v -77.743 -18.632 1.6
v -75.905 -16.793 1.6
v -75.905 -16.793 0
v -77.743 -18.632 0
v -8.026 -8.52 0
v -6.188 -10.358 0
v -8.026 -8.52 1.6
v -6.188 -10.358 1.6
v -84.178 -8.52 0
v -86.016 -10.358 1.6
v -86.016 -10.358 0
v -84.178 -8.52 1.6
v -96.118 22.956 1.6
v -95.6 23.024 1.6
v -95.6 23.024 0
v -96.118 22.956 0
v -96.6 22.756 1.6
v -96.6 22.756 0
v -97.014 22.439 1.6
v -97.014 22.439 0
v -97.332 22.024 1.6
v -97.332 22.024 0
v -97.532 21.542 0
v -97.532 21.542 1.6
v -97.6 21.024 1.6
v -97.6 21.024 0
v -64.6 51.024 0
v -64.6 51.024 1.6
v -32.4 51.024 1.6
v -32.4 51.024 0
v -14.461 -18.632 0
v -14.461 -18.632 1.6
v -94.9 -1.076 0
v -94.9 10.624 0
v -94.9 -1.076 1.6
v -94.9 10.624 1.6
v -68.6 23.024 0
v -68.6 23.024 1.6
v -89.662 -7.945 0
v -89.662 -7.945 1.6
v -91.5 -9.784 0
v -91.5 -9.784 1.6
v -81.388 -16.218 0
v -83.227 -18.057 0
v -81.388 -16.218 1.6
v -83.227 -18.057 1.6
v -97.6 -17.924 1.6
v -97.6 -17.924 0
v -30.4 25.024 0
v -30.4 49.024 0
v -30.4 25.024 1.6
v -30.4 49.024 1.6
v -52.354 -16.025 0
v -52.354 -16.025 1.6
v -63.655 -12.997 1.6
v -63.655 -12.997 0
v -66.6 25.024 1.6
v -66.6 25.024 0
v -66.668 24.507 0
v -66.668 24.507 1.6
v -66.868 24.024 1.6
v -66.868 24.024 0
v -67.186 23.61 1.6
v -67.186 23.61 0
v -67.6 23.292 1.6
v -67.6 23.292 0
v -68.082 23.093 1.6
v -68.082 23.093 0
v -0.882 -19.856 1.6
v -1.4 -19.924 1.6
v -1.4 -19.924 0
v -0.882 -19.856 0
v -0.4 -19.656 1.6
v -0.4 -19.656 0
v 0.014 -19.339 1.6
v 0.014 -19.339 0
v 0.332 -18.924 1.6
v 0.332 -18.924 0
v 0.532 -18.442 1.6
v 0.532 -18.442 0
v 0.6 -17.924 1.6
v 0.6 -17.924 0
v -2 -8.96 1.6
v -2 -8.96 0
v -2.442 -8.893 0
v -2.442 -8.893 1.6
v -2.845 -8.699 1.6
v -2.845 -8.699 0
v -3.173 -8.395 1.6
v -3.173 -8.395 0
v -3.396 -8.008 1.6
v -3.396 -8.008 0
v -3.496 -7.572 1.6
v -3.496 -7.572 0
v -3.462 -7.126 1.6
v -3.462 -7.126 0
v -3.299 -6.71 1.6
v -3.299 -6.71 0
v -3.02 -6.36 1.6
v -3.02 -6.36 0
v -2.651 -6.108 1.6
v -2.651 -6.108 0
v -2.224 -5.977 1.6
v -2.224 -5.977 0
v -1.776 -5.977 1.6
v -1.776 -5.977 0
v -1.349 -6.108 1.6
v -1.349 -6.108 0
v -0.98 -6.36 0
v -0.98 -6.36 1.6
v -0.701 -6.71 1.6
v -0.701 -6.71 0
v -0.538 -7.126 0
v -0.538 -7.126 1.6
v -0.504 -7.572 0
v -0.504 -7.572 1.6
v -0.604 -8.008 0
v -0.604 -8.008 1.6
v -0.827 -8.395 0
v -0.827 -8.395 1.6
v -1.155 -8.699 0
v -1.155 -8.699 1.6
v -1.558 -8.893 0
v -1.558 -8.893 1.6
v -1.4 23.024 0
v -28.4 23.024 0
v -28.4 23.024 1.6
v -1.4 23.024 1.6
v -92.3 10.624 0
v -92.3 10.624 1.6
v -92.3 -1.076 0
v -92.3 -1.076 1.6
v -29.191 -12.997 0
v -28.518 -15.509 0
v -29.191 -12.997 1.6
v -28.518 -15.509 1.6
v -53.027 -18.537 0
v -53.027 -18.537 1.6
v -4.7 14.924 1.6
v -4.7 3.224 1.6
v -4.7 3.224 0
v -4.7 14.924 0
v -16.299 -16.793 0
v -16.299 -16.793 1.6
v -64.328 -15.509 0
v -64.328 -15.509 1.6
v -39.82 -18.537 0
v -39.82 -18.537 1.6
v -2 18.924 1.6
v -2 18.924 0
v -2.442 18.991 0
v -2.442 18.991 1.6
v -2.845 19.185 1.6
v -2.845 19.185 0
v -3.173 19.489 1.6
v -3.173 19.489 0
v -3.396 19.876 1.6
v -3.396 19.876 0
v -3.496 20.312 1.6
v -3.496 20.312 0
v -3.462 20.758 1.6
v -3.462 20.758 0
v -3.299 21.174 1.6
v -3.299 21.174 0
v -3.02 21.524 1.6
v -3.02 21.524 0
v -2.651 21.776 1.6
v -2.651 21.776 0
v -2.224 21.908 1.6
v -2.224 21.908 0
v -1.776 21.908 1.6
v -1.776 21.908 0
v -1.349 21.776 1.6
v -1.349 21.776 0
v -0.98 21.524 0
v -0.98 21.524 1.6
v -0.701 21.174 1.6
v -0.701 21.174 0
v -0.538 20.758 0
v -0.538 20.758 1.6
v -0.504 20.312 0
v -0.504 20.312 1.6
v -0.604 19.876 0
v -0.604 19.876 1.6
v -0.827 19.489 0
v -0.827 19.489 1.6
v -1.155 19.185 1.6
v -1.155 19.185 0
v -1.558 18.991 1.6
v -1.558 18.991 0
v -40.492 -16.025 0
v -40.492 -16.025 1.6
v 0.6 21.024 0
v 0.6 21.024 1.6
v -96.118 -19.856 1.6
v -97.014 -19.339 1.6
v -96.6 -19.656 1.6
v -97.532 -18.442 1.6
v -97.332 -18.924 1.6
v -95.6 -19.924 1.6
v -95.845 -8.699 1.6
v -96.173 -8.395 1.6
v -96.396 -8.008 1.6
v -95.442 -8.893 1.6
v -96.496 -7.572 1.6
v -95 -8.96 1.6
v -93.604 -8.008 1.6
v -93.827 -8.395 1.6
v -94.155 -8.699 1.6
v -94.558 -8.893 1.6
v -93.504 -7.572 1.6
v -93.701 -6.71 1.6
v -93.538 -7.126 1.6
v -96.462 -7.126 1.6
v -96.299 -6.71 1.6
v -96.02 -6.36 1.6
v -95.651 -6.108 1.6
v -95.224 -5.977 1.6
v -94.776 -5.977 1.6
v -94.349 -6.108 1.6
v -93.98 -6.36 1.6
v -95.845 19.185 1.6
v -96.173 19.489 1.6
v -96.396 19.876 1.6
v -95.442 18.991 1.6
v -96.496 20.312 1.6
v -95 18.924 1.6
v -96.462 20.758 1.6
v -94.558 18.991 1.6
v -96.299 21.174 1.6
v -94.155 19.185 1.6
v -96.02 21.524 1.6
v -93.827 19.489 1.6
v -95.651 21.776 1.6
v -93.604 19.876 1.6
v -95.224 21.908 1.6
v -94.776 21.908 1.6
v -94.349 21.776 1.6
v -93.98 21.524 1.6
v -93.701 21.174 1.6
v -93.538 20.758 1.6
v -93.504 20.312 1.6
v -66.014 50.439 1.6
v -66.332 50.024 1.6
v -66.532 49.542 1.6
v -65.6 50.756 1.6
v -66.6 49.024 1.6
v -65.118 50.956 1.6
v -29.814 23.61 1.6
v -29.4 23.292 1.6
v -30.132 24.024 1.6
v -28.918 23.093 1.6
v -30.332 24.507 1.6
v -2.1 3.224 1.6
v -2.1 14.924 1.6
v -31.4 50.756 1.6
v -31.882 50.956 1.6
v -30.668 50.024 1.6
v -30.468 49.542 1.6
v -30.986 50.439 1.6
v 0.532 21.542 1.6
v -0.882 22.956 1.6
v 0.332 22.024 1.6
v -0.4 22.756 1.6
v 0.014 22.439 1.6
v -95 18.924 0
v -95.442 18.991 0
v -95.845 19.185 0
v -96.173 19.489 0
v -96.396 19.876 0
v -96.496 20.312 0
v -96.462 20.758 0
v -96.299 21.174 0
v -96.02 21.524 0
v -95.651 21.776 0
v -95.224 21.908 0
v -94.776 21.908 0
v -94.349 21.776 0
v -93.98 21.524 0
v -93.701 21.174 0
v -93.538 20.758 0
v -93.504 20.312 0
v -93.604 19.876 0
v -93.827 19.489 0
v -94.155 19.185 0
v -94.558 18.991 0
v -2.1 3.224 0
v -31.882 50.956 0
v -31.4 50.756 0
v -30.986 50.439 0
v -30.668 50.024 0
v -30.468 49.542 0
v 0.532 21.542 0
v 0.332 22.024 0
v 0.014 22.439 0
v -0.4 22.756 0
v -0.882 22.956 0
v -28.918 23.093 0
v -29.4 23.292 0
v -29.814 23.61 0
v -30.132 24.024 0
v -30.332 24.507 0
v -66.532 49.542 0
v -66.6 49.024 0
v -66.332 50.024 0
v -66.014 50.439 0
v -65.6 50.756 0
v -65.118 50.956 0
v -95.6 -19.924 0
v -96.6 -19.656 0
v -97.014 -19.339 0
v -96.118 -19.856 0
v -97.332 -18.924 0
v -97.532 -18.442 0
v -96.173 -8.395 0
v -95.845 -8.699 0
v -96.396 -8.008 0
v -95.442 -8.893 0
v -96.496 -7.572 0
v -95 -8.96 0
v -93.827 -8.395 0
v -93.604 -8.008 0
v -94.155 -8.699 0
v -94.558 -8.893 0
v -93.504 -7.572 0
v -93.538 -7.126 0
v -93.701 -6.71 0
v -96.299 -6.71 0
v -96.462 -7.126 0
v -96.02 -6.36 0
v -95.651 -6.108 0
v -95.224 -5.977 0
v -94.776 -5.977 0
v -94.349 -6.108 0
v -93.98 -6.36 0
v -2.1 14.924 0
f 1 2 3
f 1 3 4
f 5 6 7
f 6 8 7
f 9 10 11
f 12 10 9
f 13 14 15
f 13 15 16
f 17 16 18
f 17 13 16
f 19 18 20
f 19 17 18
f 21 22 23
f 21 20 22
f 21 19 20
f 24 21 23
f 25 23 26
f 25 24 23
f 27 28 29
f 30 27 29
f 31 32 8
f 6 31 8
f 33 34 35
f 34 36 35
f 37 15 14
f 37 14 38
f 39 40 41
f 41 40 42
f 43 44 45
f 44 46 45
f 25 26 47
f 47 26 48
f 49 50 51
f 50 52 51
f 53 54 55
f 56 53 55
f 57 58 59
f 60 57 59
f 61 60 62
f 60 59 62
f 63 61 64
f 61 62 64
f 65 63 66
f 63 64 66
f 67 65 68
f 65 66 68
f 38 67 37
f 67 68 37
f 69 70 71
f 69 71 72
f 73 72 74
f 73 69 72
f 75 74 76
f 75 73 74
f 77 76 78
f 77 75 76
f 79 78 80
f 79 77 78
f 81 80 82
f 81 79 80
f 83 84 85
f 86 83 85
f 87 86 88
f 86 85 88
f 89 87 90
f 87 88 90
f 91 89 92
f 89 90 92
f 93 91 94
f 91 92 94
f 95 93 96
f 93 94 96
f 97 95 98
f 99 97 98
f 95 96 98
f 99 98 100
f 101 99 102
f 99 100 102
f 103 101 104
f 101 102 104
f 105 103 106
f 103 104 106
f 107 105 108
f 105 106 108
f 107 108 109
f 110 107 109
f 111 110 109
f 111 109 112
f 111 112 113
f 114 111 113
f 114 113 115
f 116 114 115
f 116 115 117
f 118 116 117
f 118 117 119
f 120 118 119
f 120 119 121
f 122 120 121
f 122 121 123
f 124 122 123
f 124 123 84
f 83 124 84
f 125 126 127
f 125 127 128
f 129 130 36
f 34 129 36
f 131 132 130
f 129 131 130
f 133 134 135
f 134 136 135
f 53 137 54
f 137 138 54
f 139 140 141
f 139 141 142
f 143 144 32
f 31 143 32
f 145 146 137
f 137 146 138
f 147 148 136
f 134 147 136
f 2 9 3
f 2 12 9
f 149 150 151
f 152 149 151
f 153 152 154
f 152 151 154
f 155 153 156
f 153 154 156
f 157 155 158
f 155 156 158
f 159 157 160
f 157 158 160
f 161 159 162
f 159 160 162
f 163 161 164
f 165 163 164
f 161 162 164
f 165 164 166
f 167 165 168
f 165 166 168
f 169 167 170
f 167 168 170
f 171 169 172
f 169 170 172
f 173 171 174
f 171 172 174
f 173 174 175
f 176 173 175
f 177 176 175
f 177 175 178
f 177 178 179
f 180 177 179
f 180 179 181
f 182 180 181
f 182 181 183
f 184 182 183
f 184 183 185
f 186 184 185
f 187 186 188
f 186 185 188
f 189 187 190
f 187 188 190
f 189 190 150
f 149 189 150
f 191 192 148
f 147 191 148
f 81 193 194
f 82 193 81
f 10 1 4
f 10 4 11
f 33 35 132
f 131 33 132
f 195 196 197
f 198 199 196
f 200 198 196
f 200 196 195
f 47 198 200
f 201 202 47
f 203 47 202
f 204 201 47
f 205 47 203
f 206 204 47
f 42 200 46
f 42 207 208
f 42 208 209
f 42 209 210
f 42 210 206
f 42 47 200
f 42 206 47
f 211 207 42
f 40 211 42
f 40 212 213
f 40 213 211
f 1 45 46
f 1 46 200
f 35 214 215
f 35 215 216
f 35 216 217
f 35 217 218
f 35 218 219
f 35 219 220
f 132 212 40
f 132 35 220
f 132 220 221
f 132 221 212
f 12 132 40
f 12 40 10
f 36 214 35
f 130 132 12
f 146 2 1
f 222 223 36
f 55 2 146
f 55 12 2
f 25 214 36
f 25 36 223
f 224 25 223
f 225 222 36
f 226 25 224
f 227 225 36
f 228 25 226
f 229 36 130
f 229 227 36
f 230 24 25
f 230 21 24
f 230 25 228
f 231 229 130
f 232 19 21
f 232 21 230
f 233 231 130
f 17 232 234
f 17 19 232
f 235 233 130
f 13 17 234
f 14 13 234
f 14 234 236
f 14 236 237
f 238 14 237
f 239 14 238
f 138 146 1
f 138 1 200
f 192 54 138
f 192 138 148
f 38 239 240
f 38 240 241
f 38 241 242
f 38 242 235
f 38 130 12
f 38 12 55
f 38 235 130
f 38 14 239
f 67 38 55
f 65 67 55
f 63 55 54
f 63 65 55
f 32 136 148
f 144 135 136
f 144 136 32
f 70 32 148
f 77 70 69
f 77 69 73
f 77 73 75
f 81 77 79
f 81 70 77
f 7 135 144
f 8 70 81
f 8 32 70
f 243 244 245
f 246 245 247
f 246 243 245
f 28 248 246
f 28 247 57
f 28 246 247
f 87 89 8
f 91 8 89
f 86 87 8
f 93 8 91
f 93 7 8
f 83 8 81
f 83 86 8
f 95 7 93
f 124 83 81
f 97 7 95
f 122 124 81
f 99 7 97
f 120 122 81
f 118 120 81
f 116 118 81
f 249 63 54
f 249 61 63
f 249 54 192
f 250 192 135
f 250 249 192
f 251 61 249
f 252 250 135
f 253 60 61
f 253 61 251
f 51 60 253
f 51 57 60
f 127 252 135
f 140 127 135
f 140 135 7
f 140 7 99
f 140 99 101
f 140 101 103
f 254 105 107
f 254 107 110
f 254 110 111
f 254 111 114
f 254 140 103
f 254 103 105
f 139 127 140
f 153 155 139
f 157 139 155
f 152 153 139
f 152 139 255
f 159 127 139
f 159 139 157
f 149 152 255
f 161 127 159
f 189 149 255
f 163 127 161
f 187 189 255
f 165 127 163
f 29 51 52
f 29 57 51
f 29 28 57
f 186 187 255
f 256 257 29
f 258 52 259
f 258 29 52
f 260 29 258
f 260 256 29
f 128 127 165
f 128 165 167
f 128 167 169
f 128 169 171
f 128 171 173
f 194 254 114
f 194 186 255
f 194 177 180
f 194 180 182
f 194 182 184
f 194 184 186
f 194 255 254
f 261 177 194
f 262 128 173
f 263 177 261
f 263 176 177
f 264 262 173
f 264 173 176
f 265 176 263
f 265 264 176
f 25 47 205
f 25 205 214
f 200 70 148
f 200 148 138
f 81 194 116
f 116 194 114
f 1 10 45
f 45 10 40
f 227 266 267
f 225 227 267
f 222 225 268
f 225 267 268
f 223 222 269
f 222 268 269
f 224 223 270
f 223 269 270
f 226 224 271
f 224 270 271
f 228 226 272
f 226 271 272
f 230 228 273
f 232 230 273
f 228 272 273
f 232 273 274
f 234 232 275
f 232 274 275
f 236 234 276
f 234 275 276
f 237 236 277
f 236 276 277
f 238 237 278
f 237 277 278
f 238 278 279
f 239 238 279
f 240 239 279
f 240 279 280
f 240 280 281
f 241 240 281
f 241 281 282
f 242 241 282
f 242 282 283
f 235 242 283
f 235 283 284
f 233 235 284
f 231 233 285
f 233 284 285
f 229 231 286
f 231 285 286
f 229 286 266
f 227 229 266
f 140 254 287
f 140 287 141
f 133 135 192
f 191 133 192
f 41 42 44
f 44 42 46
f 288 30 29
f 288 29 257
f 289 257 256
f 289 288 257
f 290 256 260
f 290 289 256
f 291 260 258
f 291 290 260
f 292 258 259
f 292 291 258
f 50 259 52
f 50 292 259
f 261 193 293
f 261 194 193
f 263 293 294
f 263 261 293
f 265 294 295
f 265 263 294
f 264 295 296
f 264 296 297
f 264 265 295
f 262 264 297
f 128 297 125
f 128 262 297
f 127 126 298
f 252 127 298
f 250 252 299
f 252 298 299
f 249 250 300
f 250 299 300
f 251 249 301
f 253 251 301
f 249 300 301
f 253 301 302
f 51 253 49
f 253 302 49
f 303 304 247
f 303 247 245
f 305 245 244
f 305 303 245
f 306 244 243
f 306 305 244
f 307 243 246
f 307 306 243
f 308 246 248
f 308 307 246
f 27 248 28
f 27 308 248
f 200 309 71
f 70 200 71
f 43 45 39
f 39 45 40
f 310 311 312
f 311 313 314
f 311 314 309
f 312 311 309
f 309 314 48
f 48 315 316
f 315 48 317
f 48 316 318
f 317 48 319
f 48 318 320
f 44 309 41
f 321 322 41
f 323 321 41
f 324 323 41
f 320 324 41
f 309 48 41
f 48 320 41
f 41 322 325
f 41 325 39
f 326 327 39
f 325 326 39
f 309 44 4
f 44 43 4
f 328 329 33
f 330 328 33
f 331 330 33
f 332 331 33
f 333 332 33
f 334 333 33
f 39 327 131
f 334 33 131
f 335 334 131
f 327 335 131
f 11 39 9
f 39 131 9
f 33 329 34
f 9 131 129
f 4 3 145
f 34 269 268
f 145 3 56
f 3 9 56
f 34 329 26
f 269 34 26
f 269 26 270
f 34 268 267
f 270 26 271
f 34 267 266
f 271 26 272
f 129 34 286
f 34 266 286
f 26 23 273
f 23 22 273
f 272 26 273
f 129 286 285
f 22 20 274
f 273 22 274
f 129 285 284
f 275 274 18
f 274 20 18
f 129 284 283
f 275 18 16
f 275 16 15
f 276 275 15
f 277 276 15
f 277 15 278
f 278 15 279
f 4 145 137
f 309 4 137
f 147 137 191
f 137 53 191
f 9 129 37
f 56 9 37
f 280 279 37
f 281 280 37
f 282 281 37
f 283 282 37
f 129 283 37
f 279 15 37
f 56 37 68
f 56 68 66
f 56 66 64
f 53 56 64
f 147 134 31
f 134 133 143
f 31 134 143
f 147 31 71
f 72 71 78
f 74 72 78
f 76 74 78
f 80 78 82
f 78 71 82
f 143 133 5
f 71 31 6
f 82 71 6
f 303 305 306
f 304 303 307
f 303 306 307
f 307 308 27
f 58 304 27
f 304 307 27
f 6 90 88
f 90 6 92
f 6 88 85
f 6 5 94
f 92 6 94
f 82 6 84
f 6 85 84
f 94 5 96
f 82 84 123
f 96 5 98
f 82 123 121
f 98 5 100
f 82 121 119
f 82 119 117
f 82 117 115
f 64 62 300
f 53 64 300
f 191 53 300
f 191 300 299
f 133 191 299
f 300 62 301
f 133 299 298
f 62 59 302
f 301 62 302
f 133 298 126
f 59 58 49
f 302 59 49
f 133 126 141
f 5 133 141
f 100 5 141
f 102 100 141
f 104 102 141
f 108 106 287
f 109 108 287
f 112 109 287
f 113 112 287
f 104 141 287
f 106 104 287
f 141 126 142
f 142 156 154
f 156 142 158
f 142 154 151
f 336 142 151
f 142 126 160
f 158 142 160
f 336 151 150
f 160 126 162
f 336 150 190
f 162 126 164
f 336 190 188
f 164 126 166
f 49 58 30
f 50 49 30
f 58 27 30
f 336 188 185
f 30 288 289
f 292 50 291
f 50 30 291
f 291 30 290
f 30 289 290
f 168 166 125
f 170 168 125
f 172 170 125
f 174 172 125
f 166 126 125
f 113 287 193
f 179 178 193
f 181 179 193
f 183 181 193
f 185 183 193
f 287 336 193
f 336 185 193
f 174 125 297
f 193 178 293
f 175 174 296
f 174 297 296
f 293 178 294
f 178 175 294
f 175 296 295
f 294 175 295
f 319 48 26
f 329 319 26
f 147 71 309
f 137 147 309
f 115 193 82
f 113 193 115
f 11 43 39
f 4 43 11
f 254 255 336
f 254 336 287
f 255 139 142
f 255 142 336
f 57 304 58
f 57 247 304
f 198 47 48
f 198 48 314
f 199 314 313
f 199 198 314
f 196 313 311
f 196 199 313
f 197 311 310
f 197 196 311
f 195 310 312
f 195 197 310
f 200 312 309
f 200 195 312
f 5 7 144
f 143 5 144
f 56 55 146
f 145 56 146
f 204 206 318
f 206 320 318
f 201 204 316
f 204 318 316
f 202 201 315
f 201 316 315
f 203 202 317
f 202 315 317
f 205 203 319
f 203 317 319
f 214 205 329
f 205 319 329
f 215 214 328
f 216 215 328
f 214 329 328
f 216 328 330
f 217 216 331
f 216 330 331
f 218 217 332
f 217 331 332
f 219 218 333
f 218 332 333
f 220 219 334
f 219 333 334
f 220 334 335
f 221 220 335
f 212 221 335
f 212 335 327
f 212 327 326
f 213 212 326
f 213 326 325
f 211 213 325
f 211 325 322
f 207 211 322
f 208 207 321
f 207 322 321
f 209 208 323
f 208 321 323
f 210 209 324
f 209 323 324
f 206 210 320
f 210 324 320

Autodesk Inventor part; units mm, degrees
ref_plane "YZ Plane" through (0, 0, 0) normal (1, 0, 0) x (0, 1, 0)
ref_plane "XZ Plane" through (0, 0, 0) normal (0, 1, 0) x (-1, 0, 0)
ref_plane "XY Plane" through (0, 0, 0) normal (0, 0, 1) x (1, 0, 0)
sketch "Szkic1" plane through (0, 0, 0) normal (0, 0, 1) x (1, 0, 0)
  circle A0 centre (-2, -7.4599) radius 1.4 projected
  circle A1 centre (-2, 20.4244) radius 1.4 projected
  circle A2 centre (-95, -7.4599) radius 1.4 projected
  circle A3 centre (-95, 20.4244) radius 1.4 projected
  line L0 (-98.5, 23.9244) -> (-98.5, -20.9244) projected
  line L1 (-97.6, 23.9244) -> (-97.6, -20.9244)
  line L2 (-98.5, -20.9244) -> (-91.5, -20.9244) projected
  line L3 (-98.5, 23.9244) -> (-91.5, 23.9244) projected
  line L4 (-98.5, -19.9244) -> (-91.5, -19.9244)
  line L5 (-91.5, -7.4599) -> (-91.5, -20.9244) projected
  line L6 (-97.6, 23.0244) -> (-92.3999, 23.0244)
  line L7 (-48.5, -51.6271) -> (-48.5, 68.0164)
  line L8 (-97.6, -19.9244) -> (-48.5, -19.9244)
  line L9 (-48.5, -19.9244) -> (-48.5, 23.0244)
  line L10 (-48.5, 23.0244) -> (-97.6, 23.0244)
  line L11 (-97.6, 23.0244) -> (-97.6, -19.9244)
  line L12 (0.6, -19.9244) -> (-48.5, -19.9244)
  line L13 (-48.5, 23.0244) -> (0.6, 23.0244)
  line L14 (0.6, 23.0244) -> (0.6, -19.9244)
  point P0 (0, 0)
  dimension "d0" = 0.9
  dimension "d1" = 1
  dimension "d2" = 0.9
extrude "Wyciągnięcie proste1" add sketch "Szkic1" along normal blind 1.6 contours L1 L6 L10 L7 L8 L4 | L7 L13 L14 L12
sketch "Szkic2" plane through (0, 0, 1.6) normal (0, 0, 1) x (1, 0, 0)
  line L0 (-29.5, 25.9244) -> (-29.5, 36.1286) projected
  line L1 (-31.5, 51.9244) -> (-65.5, 51.9244) projected
  line L2 (-67.5, 36.1286) -> (-67.5, 25.9244) projected
  line L3 (0.6, 23.0244) -> (-97.6, 23.0244) projected
  line L4 (-29.5, 23.0244) -> (-67.5, 23.0244)
  line L5 (-67.5, 23.0244) -> (-67.5, 51.9244)
  line L6 (-67.5, 51.9244) -> (-29.5, 51.9244)
  line L7 (-29.5, 51.9244) -> (-29.5, 23.0244)
  line L8 (-30.4, 23.9244) -> (-66.6, 23.9244)
  line L9 (-66.6, 23.9244) -> (-66.6, 51.0244)
  line L10 (-66.6, 51.0244) -> (-30.4, 51.0244)
  line L11 (-30.4, 51.0244) -> (-30.4, 23.9244)
  line L12 (-30.4, 23.9244) -> (-30.4, 23.0244)
  line L13 (-66.6, 23.9244) -> (-66.6, 23.0244)
  point P0 (0, 0)
  point P1 (-67.5, 37.4744)
  point P2 (-29.5, 37.4744)
  point P3 (-29.5, 31.0265)
  point P4 (-48.5, 51.9244)
  dimension "d5" = 0.9
extrude "Wyciągnięcie proste2" add sketch "Szkic2" against normal blind 1.6 contours L3 L13 L8 L12 | L8 L9 L10 L11
sketch "Szkic3" plane through (0, 0, 1.6) normal (0, 0, 1) x (1, 0, 0)
  line L0 (-94.4, -0.5756) -> (-94.4, 10.1244) projected
  line L1 (-94.4, 10.1244) -> (-92.8, 10.1244) projected
  line L2 (-92.8, 10.1244) -> (-92.8, -0.5756) projected
  line L3 (-94.4, -0.5756) -> (-92.8, -0.5756) projected
  line L4 (-77.7433, -17.9244) -> (-76.6119, -16.7931) projected
  line L5 (-77.7433, -17.9244) -> (-85.3094, -10.3584) projected
  line L6 (-84.178, -9.227) -> (-76.6119, -16.7931) projected
  line L7 (-85.3094, -10.3584) -> (-84.178, -9.227) projected
  line L8 (-63.3019, -13.6096) -> (-52.9665, -16.379) projected
  line L9 (-63.716, -15.1551) -> (-63.3019, -13.6096) projected
  line L10 (-53.3806, -17.9244) -> (-63.716, -15.1551) projected
  line L11 (-29.1305, -15.1551) -> (-39.4659, -17.9244) projected
  line L12 (-39.88, -16.379) -> (-29.5446, -13.6096) projected
  line L13 (-29.1305, -15.1551) -> (-29.5446, -13.6096) projected
  line L14 (-39.4659, -17.9244) -> (-39.88, -16.379) projected
  line L15 (-53.3806, -17.9244) -> (-52.9665, -16.379) projected
  line L16 (-14.4607, -17.9244) -> (-15.592, -16.7931) projected
  line L17 (-15.592, -16.7931) -> (-8.026, -9.227) projected
  line L18 (-6.8946, -10.3584) -> (-14.4607, -17.9244) projected
  line L19 (-6.8946, -10.3584) -> (-8.026, -9.227) projected
  line L20 (-2.6, 14.4244) -> (-4.2, 14.4244) projected
  line L21 (-4.2, 3.7244) -> (-4.2, 14.4244) projected
  line L22 (-2.6, 3.7244) -> (-4.2, 3.7244) projected
  line L23 (-2.6, 14.4244) -> (-2.6, 3.7244) projected
  line L24 (-92.3, -1.0756) -> (-92.3, 10.6244)
  line L25 (-92.3, 10.6244) -> (-94.9, 10.6244)
  line L26 (-94.9, 10.6244) -> (-94.9, -1.0756)
  line L27 (-94.9, -1.0756) -> (-92.3, -1.0756)
  line L28 (-75.9048, -16.7931) -> (-77.7433, -18.6316)
  line L29 (-77.7433, -18.6316) -> (-86.0165, -10.3584)
  line L30 (-86.0165, -10.3584) -> (-84.178, -8.5199)
  line L31 (-84.178, -8.5199) -> (-75.9048, -16.7931)
  line L32 (-52.3541, -16.0254) -> (-63.6554, -12.9972)
  line L33 (-63.6554, -12.9972) -> (-64.3284, -15.5086)
  line L34 (-64.3284, -15.5086) -> (-53.027, -18.5368)
  line L35 (-53.027, -18.5368) -> (-52.3541, -16.0254)
  line L36 (-29.1911, -12.9972) -> (-40.4924, -16.0254)
  line L37 (-40.4924, -16.0254) -> (-39.8195, -18.5368)
  line L38 (-39.8195, -18.5368) -> (-28.5181, -15.5086)
  line L39 (-28.5181, -15.5086) -> (-29.1911, -12.9972)
  line L40 (-8.026, -8.5199) -> (-16.2991, -16.7931)
  line L41 (-16.2991, -16.7931) -> (-14.4607, -18.6316)
  line L42 (-14.4607, -18.6316) -> (-6.1875, -10.3584)
  line L43 (-6.1875, -10.3584) -> (-8.026, -8.5199)
  line L44 (-4.7, 3.2244) -> (-4.7, 14.9244)
  line L45 (-4.7, 14.9244) -> (-2.1, 14.9244)
  line L46 (-2.1, 14.9244) -> (-2.1, 3.2244)
  line L47 (-2.1, 3.2244) -> (-4.7, 3.2244)
  point P0 (0, 0)
  dimension "d8" = 0.5
  dimension "d9" = 0.5
  dimension "d10" = 0.5
  dimension "d11" = 0.5
  dimension "d12" = 0.5
  dimension "d13" = 0.5
extrude "Wyciągnięcie proste3" cut sketch "Szkic3" against normal blind 1.6 contours L0 L1 L2 L3 | L5 L7 L6 L4 | L8 L15 L10 L9 | L11 L14 L12 L13 | L16 L17 L19 L18 | L23 L22 L21 L20 | L27 L26 L25 L24 | L28 L29 L30 L31 | L35 L34 L33 L32 | L39 L38 L37 L36 | L43 L42 L41 L40 | L44 L45 L46 L47
fillet "Zaokrąglenie1" radius 2 8 edges at (-66.6, 51.0244, 0.8) (-66.6, 23.0244, 0.8) (-97.6, 23.0244, 0.8) (-97.6, -19.9244, 0.8) (0.6, 23.0244, 0.8) (0.6, -19.9244, 0.8) (-30.4, 23.0244, 0.8) (-30.4, 51.0244, 0.8)
sketch "Szkic4" plane through (0, 0, 1.6) normal (0, 0, 1) x (1, 0, 0)
  circle A0 centre (-2, 20.4244) radius 1.4 projected
  circle A1 centre (-2, -7.4599) radius 1.4 projected
  circle A2 centre (-95, 20.4244) radius 1.4 projected
  circle A3 centre (-95, -7.4599) radius 1.4 projected
  point P0 (0, 0)
hole "Otwór1" at (-2, 20.4244, 1.6) at (-2, -7.4599, 1.6) at (-95, 20.4244, 1.6) at (-95, -7.4599, 1.6) direction (0, 0, -1) diameter 3 end through all
sketch "Szkic5" plane through (0, 0, 1.6) normal (0, 0, 1) x (1, 0, 0)
  circle A0 centre (-95, 20.4244) radius 1.5 projected
  circle A1 centre (-2, 20.4244) radius 1.5 projected
  circle A2 centre (-2, -7.4599) radius 1.5 projected
  circle A3 centre (-95, -7.4599) radius 1.5 projected
  arc A4 (-30.4, 49.0244) -> (-32.4, 51.0244) centre (-32.4, 49.0244) ccw projected
  line L0 (-32.4, 51.0244) -> (-64.6, 51.0244) projected
  arc A5 (-64.6, 51.0244) -> (-66.6, 49.0244) centre (-64.6, 49.0244) ccw projected
  line L1 (-66.6, 49.0244) -> (-66.6, 25.0244) projected
  arc A6 (-68.6, 23.0244) -> (-66.6, 25.0244) centre (-68.6, 25.0244) ccw projected
  line L2 (-68.6, 23.0244) -> (-95.6, 23.0244) projected
  arc A7 (-95.6, 23.0244) -> (-97.6, 21.0244) centre (-95.6, 21.0244) ccw projected
  line L3 (-97.6, 21.0244) -> (-97.6, -17.9244) projected
  arc A8 (-97.6, -17.9244) -> (-95.6, -19.9244) centre (-95.6, -17.9244) ccw projected
  line L4 (-95.6, -19.9244) -> (-1.4, -19.9244) projected
  arc A9 (-1.4, -19.9244) -> (0.6, -17.9244) centre (-1.4, -17.9244) ccw projected
  line L5 (0.6, -17.9244) -> (0.6, 21.0244) projected
  arc A10 (0.6, 21.0244) -> (-1.4, 23.0244) centre (-1.4, 21.0244) ccw projected
  line L6 (-1.4, 23.0244) -> (-28.4, 23.0244) projected
  arc A11 (-30.4, 25.0244) -> (-28.4, 23.0244) centre (-28.4, 25.0244) ccw projected
  line L7 (-30.4, 25.0244) -> (-30.4, 49.0244) projected
  line L8 (-94.9, -1.0756) -> (-94.9, 10.6244) projected
  line L9 (-94.9, 10.6244) -> (-92.3, 10.6244) projected
  line L10 (-92.3, 10.6244) -> (-92.3, -1.0756) projected
  line L11 (-92.3, -1.0756) -> (-94.9, -1.0756) projected
  line L12 (-6.1875, -10.3584) -> (-14.4607, -18.6316) projected
  line L13 (-14.4607, -18.6316) -> (-16.2991, -16.7931) projected
  line L14 (-16.2991, -16.7931) -> (-8.026, -8.5199) projected
  line L15 (-8.026, -8.5199) -> (-6.1875, -10.3584) projected
  line L16 (-28.5181, -15.5086) -> (-39.8195, -18.5368) projected
  line L17 (-39.8195, -18.5368) -> (-40.4924, -16.0254) projected
  line L18 (-40.4924, -16.0254) -> (-29.1911, -12.9972) projected
  line L19 (-29.1911, -12.9972) -> (-28.5181, -15.5086) projected
  line L20 (-77.7433, -18.6316) -> (-86.0165, -10.3584) projected
  line L21 (-86.0165, -10.3584) -> (-84.178, -8.5199) projected
  line L22 (-84.178, -8.5199) -> (-75.9048, -16.7931) projected
  line L23 (-75.9048, -16.7931) -> (-77.7433, -18.6316) projected
  line L24 (-4.7, 14.9244) -> (-2.1, 14.9244) projected
  line L25 (-2.1, 14.9244) -> (-2.1, 3.2244) projected
  line L26 (-2.1, 3.2244) -> (-4.7, 3.2244) projected
  line L27 (-4.7, 3.2244) -> (-4.7, 14.9244) projected
  line L28 (-53.027, -18.5368) -> (-64.3284, -15.5086) projected
  line L29 (-64.3284, -15.5086) -> (-63.6554, -12.9972) projected
  line L30 (-63.6554, -12.9972) -> (-52.3541, -16.0254) projected
  line L31 (-52.3541, -16.0254) -> (-53.027, -18.5368) projected
  line L32 (-91.5, -9.7839) -> (-83.2269, -18.057)
  line L33 (-83.2269, -18.057) -> (-81.3884, -16.2185)
  line L34 (-81.3884, -16.2185) -> (-89.6615, -7.9454)
  line L35 (-89.6615, -7.9454) -> (-91.5, -9.7839)
  line L36 (-91.5, -7.4599) -> (-91.5, -20.9244) projected
  line L37 (-77.7433, -18.057) -> (-77.7433, -19.9244) construction
  line L38 (-83.2269, -18.057) -> (-83.2269, -19.9244) construction
  point P0 (0, 0)
extrude "Wyciągnięcie proste4" cut sketch "Szkic5" against normal through all contours L35 L34 L33 L32
properties part number "main_pcb"
